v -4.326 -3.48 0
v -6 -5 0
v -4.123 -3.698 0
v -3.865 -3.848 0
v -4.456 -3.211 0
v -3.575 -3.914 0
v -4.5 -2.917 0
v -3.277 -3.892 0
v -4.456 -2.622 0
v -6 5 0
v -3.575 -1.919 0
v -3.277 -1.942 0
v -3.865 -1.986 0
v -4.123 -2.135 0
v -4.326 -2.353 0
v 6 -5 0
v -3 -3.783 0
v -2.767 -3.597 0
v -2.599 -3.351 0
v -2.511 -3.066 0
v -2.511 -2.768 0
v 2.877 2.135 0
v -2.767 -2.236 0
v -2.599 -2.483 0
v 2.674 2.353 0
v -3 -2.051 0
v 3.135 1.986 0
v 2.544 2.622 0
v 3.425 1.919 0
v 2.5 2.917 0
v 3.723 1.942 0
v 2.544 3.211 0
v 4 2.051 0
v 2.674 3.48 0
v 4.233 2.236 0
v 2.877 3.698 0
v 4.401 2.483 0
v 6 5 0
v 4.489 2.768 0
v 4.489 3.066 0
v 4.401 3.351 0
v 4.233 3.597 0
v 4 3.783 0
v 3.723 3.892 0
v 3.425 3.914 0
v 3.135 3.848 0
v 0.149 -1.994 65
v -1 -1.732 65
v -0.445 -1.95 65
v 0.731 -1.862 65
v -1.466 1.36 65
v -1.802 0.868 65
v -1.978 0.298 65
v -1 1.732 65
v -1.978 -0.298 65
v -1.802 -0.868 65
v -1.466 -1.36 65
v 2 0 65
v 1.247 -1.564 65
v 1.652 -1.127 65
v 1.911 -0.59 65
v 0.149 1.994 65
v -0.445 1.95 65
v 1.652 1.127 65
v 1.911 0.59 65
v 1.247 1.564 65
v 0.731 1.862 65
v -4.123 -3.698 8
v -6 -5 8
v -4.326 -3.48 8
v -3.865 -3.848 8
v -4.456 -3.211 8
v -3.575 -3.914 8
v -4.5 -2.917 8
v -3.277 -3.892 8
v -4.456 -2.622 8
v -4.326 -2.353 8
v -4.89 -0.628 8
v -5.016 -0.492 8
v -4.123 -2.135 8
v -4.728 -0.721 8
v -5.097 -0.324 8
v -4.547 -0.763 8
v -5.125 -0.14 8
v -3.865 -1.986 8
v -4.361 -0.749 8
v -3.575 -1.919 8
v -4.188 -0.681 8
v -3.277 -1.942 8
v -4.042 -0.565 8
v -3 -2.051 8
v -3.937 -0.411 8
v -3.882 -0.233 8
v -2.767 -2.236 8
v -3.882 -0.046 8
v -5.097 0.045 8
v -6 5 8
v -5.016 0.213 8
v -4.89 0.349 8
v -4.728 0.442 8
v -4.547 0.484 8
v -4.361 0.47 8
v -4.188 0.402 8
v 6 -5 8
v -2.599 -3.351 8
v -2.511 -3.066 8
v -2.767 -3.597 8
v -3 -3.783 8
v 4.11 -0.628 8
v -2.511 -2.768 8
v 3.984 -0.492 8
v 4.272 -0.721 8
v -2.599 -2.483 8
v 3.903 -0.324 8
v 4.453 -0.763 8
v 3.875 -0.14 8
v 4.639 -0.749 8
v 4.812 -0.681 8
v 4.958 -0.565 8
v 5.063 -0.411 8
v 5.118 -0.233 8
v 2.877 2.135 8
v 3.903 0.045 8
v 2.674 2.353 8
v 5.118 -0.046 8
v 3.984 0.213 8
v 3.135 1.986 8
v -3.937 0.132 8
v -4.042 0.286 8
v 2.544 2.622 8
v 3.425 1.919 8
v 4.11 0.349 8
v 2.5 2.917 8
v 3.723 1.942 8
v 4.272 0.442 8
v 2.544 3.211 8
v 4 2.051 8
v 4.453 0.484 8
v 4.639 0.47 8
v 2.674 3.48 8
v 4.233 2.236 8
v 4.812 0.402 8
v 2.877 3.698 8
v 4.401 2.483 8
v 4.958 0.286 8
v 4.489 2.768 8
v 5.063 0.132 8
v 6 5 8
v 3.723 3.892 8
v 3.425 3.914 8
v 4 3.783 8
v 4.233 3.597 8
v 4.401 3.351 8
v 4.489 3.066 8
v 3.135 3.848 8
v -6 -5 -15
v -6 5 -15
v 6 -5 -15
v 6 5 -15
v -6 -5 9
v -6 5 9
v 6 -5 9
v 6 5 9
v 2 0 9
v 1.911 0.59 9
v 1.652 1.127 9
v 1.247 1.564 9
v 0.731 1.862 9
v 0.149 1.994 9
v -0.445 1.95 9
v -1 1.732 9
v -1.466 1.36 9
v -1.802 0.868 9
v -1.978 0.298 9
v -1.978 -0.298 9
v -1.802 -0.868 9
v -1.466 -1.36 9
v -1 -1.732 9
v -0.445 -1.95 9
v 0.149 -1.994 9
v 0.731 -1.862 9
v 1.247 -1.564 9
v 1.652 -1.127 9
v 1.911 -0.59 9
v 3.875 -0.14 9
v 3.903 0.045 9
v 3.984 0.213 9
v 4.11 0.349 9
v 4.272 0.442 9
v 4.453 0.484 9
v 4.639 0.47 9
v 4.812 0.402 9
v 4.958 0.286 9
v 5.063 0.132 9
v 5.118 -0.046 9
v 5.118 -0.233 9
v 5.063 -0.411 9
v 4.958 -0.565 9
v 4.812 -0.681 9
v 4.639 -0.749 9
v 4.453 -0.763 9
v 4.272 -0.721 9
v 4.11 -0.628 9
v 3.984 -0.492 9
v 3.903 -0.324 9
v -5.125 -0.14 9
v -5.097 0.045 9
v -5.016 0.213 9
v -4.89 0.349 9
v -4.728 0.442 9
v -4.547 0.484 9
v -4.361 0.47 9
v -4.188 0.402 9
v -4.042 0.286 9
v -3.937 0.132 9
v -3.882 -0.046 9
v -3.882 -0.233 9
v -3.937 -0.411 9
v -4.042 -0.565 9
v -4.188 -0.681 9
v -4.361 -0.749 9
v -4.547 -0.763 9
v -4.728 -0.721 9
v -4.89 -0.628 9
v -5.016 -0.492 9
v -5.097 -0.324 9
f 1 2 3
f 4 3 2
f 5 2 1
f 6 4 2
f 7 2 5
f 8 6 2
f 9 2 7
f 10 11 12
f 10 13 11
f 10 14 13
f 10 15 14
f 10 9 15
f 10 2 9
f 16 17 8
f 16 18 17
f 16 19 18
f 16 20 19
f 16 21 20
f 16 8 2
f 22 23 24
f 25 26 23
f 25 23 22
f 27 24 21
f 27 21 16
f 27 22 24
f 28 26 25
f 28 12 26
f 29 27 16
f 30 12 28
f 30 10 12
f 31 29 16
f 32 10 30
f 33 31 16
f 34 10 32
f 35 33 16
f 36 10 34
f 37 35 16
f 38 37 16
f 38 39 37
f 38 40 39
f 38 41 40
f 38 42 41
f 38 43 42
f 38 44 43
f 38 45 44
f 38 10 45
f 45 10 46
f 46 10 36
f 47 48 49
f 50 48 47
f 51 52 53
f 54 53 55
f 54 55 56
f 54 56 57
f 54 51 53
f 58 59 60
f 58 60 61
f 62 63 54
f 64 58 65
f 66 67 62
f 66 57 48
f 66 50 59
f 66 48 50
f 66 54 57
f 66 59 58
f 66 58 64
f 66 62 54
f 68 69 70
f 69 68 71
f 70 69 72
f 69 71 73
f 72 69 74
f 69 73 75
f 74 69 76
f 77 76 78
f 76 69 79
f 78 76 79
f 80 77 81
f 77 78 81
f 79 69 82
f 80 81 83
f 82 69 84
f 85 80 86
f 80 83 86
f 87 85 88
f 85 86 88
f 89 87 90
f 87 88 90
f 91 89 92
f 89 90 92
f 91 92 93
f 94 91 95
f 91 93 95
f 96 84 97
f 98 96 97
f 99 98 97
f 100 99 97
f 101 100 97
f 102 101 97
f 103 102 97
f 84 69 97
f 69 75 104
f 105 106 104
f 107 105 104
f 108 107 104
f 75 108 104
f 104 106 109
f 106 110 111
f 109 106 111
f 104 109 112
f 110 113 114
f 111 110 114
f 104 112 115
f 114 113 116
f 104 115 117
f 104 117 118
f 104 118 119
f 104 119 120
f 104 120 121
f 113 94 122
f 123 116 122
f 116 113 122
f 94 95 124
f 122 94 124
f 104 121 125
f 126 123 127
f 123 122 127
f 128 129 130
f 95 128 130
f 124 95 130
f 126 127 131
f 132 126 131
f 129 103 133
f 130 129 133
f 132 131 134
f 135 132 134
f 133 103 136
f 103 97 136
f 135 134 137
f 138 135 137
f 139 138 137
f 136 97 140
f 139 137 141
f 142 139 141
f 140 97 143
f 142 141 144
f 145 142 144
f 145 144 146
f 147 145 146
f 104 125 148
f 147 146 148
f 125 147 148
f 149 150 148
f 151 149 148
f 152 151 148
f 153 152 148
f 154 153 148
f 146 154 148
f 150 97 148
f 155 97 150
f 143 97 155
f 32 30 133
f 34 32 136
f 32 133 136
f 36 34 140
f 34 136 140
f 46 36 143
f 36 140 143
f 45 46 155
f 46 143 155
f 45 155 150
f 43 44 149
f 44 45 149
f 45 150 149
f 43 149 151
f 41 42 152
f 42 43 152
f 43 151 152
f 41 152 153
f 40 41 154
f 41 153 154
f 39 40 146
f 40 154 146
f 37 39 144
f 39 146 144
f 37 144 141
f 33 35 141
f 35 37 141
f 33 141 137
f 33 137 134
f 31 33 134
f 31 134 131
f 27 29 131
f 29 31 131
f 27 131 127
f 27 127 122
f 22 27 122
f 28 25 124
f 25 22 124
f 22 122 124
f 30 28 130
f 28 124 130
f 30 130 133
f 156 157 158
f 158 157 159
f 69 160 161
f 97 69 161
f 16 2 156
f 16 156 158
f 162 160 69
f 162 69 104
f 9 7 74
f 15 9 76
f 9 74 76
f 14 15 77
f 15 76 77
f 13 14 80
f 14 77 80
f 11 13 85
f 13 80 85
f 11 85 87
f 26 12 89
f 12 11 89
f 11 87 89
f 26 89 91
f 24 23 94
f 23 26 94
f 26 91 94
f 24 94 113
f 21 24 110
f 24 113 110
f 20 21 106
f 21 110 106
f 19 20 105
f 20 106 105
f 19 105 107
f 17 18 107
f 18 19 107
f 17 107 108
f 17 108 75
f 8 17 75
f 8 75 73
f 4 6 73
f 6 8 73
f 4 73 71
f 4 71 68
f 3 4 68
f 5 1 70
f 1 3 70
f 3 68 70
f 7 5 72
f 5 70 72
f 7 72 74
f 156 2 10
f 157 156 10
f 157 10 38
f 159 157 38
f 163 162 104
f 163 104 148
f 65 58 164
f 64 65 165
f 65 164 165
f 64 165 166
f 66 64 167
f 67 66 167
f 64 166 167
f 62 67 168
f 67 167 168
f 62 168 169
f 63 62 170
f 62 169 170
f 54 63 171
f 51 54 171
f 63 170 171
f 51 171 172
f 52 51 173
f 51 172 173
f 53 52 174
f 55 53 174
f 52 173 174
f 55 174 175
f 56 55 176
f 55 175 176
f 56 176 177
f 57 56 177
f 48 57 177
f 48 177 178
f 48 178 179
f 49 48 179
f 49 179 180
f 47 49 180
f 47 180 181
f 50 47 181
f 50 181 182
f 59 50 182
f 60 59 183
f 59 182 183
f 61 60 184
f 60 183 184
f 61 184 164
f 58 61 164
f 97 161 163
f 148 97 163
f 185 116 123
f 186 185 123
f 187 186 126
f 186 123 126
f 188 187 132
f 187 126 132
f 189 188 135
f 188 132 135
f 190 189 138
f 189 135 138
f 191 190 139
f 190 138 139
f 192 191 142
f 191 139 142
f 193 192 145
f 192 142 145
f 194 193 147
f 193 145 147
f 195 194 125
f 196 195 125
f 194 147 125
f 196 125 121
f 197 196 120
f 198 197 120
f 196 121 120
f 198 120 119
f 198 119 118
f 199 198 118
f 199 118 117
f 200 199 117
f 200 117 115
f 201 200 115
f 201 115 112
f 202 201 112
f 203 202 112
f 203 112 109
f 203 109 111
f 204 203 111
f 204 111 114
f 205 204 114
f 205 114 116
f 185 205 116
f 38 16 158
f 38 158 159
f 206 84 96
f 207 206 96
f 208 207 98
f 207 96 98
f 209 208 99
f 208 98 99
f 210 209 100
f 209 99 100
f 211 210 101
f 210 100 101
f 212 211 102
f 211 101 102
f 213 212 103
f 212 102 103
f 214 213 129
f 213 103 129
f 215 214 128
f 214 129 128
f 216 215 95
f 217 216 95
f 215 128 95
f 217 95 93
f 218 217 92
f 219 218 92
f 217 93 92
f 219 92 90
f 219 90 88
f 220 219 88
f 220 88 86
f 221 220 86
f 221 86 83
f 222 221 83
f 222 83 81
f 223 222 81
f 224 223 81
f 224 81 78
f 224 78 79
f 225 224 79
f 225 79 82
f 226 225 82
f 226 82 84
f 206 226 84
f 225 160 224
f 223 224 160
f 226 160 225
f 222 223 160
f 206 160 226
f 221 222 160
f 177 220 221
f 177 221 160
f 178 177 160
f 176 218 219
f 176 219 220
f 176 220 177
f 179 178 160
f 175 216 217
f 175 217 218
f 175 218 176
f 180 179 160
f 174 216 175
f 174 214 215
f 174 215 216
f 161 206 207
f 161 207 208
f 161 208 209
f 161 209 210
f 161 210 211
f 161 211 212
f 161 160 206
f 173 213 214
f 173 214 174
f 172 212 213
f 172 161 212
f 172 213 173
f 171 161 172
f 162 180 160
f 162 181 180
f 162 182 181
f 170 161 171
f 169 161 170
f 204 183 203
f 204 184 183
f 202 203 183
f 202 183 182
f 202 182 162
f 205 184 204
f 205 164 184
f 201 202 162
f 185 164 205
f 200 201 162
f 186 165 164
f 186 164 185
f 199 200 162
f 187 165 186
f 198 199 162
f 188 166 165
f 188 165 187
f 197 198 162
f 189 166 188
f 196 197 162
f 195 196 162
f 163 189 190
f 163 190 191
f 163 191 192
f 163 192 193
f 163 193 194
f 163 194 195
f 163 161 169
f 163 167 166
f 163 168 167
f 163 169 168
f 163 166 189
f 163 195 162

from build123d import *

# Parameters (mm, degrees)
SKETCH2_W               = 12
SKETCH2_H               = 10
BOSS_EXTRUDE1_DEPTH     = 15
SKETCH3_W               = 12
SKETCH3_H               = 10
BOSS_EXTRUDE2_DEPTH     = 1
SKETCH4_R               = 2
BOSS_EXTRUDE3_DEPTH     = 56
BOSS_EXTRUDE4_REACH     = 59.533
SKETCH5_R               = 1
M1_6_TAPPED_HOLE1_D     = 1.25
M1_6_TAPPED_HOLE1_DEPTH = 4.25
M1_6_TAPPED_HOLE1_TIP   = 0.375537887


with BuildPart() as part:
    # Sketch2 → Boss-Extrude1 (new body)
    with BuildSketch(Plane.XY):
        Rectangle(SKETCH2_W, SKETCH2_H)
    extrude(amount=-BOSS_EXTRUDE1_DEPTH)

    # Sketch5 → Boss-Extrude4 (add, up to next)
    with BuildSketch(Plane(origin=(0, 0, 8), x_dir=(-1, 0, 0), z_dir=(0, 0, -1)), mode=Mode.PRIVATE) as boss_extrude4_sk1:
        with Locations((-3.5, 2.916666667)):
            Circle(SKETCH5_R)
    boss_extrude4_tool1 = extrude(boss_extrude4_sk1.sketch, amount=BOSS_EXTRUDE4_REACH, mode=Mode.PRIVATE) - part.part
    # Sketch5 → Boss-Extrude4 (add, up to next)
    with BuildSketch(Plane(origin=(0, 0, 8), x_dir=(-1, 0, 0), z_dir=(0, 0, -1)), mode=Mode.PRIVATE) as boss_extrude4_sk2:
        with Locations((3.5, -2.916666667)):
            Circle(SKETCH5_R)
    boss_extrude4_tool2 = extrude(boss_extrude4_sk2.sketch, amount=BOSS_EXTRUDE4_REACH, mode=Mode.PRIVATE) - part.part


with BuildPart() as body_2:
    # Sketch3 → Boss-Extrude2 (new body)
    with BuildSketch(Plane.XY.offset(9)):
        Rectangle(SKETCH3_W, SKETCH3_H)
    extrude(amount=-BOSS_EXTRUDE2_DEPTH)

    # Sketch4 → Boss-Extrude3 (add)
    with BuildSketch(Plane.XY.offset(9)):
        Circle(SKETCH4_R)
    extrude(amount=BOSS_EXTRUDE3_DEPTH)


with BuildPart() as part_1:
    add(part.part)

    add(body_2.part)  # Boss-Extrude4 merges body 2
    add(boss_extrude4_tool1.solids().sort_by_distance((3.5, 2.916667, 8))[0])
    add(boss_extrude4_tool2.solids().sort_by_distance((-3.5, -2.916667, 8))[0])

    # M1.6 Tapped Hole1
    with Locations(Plane.XY.offset(9)):
        with Locations((-4.5, -0.139522792), (4.5, -0.139522792)):
            Hole(M1_6_TAPPED_HOLE1_D / 2, depth=M1_6_TAPPED_HOLE1_DEPTH)
            with Locations((0, 0, -(M1_6_TAPPED_HOLE1_DEPTH + M1_6_TAPPED_HOLE1_TIP / 2))):  # 118° drill point
                Cone(0, M1_6_TAPPED_HOLE1_D / 2, M1_6_TAPPED_HOLE1_TIP, mode=Mode.SUBTRACT)


solid = part_1.part
